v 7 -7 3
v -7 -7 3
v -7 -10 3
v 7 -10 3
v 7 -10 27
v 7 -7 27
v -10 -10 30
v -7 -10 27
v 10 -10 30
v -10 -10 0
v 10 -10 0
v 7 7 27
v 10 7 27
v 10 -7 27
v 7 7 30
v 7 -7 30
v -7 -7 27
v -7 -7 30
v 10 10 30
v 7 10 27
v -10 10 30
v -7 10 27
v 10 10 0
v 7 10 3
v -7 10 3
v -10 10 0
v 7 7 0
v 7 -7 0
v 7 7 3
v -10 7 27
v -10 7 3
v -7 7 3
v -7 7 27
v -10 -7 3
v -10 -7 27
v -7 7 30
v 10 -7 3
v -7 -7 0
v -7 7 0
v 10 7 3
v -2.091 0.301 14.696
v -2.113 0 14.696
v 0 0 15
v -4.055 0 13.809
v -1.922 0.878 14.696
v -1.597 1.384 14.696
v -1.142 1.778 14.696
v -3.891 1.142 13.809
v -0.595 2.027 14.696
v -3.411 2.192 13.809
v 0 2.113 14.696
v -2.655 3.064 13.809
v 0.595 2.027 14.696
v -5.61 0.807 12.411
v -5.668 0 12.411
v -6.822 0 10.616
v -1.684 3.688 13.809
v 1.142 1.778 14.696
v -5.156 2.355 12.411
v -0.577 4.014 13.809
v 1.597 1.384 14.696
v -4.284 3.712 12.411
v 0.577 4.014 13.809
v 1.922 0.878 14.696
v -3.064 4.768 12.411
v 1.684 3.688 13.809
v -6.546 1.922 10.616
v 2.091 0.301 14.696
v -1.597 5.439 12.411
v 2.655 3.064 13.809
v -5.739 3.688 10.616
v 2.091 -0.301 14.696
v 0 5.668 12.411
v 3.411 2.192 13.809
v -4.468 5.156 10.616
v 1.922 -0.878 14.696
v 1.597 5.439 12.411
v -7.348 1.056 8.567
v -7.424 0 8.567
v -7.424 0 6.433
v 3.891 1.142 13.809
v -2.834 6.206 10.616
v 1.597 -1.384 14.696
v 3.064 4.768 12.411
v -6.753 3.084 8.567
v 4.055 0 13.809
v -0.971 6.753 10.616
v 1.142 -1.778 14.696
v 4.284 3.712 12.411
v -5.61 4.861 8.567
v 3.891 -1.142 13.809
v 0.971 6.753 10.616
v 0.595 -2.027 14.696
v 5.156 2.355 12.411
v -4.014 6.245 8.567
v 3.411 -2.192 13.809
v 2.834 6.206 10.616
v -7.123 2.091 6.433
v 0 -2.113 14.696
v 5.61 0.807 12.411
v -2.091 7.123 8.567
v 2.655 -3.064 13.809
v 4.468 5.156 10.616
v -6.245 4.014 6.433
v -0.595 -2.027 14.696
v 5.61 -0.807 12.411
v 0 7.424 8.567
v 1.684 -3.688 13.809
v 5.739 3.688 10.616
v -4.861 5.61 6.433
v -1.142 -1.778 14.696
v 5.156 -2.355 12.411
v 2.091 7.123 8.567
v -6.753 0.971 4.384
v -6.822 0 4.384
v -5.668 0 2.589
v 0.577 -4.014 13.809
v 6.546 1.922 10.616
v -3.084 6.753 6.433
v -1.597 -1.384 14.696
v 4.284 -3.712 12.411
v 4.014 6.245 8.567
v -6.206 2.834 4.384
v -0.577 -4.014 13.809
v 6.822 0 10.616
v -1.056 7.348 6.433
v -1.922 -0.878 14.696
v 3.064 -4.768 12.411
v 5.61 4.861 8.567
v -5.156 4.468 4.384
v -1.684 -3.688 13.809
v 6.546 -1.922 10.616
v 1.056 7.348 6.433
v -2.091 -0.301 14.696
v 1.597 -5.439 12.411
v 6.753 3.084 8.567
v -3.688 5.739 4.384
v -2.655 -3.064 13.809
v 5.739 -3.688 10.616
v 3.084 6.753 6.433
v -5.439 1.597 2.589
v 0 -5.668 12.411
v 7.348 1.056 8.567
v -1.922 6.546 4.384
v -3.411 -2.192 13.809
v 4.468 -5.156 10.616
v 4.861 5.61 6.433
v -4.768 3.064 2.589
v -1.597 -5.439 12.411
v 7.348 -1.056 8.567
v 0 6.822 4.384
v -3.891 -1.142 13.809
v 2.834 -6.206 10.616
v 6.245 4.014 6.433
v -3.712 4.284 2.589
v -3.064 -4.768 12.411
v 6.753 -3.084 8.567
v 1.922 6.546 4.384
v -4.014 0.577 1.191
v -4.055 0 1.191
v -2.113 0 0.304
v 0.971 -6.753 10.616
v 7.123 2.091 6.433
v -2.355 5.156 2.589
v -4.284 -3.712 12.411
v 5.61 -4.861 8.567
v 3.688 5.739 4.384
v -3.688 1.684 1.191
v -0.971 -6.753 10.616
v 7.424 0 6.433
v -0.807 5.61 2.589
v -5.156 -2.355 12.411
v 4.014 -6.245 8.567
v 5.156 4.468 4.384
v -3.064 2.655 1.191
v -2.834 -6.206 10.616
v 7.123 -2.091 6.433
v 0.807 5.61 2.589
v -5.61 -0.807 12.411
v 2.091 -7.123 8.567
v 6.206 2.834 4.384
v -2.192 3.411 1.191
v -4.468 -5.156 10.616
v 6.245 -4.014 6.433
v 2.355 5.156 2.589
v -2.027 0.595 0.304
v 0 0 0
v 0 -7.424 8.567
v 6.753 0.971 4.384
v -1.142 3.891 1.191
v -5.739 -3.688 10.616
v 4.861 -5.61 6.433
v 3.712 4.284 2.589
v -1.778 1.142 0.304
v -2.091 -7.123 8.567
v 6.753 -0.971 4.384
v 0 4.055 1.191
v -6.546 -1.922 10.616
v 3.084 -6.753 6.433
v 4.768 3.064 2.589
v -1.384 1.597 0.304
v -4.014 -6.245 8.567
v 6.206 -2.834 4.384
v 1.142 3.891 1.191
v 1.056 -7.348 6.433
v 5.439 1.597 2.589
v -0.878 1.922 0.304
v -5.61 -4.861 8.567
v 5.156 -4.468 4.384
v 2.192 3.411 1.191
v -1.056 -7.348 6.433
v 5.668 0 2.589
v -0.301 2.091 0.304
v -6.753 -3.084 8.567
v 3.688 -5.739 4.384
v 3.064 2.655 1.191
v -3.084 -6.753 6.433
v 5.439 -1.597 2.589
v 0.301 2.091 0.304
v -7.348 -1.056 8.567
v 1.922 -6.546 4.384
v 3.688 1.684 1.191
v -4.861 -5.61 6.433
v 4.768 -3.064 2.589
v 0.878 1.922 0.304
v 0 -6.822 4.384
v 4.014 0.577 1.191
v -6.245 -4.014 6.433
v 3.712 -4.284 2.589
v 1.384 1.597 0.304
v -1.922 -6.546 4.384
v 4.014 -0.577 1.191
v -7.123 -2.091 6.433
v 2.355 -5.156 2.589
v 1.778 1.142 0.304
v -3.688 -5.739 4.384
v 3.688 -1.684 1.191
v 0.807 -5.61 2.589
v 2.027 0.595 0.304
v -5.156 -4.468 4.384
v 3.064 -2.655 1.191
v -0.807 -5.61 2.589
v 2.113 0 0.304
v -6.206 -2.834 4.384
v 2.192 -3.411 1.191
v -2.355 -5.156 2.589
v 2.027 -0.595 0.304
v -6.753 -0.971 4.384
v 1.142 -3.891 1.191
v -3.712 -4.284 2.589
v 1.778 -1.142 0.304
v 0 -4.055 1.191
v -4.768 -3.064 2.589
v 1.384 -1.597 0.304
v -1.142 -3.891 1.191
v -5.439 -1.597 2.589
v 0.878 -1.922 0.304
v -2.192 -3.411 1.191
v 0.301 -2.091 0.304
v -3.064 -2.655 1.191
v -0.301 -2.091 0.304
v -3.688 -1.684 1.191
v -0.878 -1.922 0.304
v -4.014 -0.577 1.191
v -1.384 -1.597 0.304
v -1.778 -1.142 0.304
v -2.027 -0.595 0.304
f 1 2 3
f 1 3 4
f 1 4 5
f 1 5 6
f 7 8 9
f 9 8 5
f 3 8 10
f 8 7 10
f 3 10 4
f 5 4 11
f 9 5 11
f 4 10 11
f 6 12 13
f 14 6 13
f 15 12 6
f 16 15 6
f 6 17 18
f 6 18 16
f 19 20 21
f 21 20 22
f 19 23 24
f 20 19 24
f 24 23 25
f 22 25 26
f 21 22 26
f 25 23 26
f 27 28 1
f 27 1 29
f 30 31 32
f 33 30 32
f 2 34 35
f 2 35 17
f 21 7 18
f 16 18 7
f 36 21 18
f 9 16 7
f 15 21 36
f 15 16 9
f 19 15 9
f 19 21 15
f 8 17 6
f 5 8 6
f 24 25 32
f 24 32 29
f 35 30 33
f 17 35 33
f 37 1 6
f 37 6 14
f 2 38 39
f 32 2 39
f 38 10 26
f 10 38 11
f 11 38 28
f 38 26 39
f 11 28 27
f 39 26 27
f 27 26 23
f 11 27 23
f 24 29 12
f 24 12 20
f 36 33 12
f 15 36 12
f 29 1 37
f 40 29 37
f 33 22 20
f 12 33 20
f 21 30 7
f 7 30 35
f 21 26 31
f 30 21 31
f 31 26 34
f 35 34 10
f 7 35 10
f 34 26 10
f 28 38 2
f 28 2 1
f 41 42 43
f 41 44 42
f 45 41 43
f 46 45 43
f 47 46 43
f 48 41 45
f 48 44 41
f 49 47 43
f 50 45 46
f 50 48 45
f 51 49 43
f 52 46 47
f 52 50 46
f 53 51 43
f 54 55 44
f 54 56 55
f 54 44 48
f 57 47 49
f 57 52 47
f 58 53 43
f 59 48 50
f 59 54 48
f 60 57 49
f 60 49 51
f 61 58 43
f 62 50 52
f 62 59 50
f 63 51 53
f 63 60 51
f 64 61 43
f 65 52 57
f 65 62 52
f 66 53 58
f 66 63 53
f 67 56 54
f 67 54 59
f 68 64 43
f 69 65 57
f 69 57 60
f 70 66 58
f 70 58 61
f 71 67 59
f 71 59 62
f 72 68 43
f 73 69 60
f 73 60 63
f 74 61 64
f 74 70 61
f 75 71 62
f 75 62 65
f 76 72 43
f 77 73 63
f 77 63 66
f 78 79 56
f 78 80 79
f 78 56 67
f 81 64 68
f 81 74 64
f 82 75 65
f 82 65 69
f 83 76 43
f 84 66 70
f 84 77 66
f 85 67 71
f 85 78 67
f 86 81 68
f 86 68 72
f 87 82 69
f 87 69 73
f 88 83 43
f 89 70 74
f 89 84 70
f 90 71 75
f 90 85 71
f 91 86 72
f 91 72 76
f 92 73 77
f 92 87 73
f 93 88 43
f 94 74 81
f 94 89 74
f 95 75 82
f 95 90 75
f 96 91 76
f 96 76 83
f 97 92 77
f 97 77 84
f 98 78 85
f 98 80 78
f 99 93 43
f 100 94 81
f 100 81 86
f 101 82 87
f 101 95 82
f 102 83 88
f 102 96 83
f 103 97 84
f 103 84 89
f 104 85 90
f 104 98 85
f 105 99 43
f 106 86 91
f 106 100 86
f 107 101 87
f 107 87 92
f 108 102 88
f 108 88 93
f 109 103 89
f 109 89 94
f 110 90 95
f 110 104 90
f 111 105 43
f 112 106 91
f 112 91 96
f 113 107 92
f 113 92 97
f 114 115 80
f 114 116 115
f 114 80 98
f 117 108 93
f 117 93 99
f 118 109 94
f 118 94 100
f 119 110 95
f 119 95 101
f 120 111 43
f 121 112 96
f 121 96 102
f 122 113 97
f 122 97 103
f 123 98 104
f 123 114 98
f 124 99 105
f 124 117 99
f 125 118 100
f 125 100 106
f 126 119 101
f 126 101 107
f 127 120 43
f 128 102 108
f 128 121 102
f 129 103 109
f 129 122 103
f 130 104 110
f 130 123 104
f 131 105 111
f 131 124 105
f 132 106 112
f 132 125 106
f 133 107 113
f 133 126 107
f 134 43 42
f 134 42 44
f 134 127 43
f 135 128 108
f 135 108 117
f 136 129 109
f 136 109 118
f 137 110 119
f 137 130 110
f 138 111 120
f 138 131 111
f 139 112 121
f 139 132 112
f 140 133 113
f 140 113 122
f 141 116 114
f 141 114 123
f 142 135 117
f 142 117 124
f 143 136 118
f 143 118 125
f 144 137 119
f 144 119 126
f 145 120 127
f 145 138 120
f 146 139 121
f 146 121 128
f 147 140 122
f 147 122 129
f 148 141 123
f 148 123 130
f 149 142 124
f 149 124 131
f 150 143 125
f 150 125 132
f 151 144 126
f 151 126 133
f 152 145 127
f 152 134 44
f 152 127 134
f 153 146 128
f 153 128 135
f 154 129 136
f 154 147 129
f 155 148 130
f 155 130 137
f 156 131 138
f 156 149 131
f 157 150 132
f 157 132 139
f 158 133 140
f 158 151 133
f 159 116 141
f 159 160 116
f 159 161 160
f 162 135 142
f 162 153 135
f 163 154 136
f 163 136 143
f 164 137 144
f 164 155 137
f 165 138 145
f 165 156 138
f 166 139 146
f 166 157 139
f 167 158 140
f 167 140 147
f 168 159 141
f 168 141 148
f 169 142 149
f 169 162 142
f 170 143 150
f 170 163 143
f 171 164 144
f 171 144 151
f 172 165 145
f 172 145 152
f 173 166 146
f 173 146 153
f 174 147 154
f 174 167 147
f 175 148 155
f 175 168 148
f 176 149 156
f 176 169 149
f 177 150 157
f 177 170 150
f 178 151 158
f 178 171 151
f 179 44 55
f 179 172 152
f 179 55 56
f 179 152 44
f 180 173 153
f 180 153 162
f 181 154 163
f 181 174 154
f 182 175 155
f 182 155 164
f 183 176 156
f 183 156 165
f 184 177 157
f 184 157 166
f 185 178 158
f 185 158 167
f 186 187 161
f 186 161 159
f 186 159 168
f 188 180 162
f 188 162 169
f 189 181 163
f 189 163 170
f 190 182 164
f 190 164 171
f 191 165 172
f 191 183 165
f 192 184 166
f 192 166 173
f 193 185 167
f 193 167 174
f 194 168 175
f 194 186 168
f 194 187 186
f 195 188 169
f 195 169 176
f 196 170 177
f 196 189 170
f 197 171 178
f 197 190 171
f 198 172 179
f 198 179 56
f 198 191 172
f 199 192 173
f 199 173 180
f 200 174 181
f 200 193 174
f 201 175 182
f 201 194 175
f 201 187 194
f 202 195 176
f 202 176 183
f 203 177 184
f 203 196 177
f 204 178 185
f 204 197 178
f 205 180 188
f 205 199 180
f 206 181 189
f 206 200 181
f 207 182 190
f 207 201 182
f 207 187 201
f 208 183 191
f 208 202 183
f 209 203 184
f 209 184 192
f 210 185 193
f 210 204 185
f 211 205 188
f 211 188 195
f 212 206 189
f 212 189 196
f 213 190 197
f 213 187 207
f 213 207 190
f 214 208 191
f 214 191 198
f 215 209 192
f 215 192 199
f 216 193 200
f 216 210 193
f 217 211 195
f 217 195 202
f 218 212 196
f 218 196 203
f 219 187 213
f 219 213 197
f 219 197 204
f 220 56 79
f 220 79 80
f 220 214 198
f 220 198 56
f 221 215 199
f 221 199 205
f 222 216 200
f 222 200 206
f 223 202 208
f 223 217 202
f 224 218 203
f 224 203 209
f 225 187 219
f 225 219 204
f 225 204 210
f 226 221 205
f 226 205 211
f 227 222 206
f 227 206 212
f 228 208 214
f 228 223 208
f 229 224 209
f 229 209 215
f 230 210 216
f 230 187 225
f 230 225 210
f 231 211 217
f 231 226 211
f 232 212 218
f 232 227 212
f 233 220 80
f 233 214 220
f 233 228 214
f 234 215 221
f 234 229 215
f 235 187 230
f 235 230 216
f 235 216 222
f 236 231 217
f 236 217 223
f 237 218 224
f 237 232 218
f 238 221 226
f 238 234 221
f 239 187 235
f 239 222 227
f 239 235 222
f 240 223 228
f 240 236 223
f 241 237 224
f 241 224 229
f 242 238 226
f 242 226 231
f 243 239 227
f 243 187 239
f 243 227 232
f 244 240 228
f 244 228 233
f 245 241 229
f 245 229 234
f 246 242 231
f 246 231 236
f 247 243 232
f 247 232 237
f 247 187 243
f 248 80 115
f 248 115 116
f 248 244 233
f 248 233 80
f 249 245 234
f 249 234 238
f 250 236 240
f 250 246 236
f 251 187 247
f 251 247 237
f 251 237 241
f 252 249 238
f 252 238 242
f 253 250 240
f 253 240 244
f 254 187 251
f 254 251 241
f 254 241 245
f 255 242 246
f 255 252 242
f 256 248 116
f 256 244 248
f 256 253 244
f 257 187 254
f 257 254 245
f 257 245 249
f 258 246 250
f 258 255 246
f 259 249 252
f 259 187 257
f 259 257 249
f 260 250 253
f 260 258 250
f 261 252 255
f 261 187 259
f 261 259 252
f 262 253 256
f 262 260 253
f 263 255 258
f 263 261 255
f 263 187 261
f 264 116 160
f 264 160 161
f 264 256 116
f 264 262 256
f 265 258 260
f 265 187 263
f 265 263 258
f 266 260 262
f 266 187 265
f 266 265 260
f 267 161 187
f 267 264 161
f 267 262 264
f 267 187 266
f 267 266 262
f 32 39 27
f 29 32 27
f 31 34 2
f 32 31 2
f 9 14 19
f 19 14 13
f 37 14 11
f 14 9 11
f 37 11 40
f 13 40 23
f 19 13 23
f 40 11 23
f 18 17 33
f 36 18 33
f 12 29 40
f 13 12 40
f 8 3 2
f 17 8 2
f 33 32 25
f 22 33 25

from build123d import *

# Parameters (mm, degrees)
F0_W     = 14
F0_H     = 3
F0_W_2   = 3
F0_H_2   = 14
F1_DEPTH = 3
F2_DEPTH = 30
F3_START = 27
F3_DEPTH = 3


with BuildPart() as f1:
    # F0 (on Top) → F1 (new body)
    with BuildSketch(Plane.XY):
        with Locations((0, -8.5)):
            Rectangle(F0_W, F0_H)
        with Locations((-8.5, 0)):
            Rectangle(F0_W_2, F0_H_2)
        with Locations((0, 8.5)):
            Rectangle(F0_W, F0_H)
        with Locations((8.5, 0)):
            Rectangle(F0_W_2, F0_H_2)
        with Locations((-8.5, -8.5)):
            Rectangle(F0_W_2, F0_H)
        with Locations((8.5, -8.5)):
            Rectangle(F0_W_2, F0_H)
        with Locations((8.5, 8.5)):
            Rectangle(F0_W_2, F0_H)
        with Locations((-8.5, 8.5)):
            Rectangle(F0_W_2, F0_H)
    extrude(amount=F1_DEPTH)

    # F0 (on Top) → F2 (join)
    with BuildSketch(Plane.XY):
        with Locations((-8.5, -8.5)):
            Rectangle(F0_W_2, F0_H)
        with Locations((-8.5, 8.5)):
            Rectangle(F0_W_2, F0_H)
        with Locations((8.5, 8.5)):
            Rectangle(F0_W_2, F0_H)
        with Locations((8.5, -8.5)):
            Rectangle(F0_W_2, F0_H)
    extrude(amount=F2_DEPTH)

    # F0 (on Top) → F3 (join)
    with BuildSketch(Plane.XY.offset(F3_START)):
        with Locations((8.5, 8.5)):
            Rectangle(F0_W_2, F0_H)
        with Locations((0, 8.5)):
            Rectangle(F0_W, F0_H)
        with Locations((8.5, 0)):
            Rectangle(F0_W_2, F0_H_2)
        with Locations((-8.5, 8.5)):
            Rectangle(F0_W_2, F0_H)
        with Locations((8.5, -8.5)):
            Rectangle(F0_W_2, F0_H)
        with Locations((-8.5, 0)):
            Rectangle(F0_W_2, F0_H_2)
        with Locations((0, -8.5)):
            Rectangle(F0_W, F0_H)
        with Locations((-8.5, -8.5)):
            Rectangle(F0_W_2, F0_H)
    extrude(amount=F3_DEPTH)


with BuildPart() as f5:
    # F4 (on Front) → F5 (revolve)
    with BuildSketch(Plane.XZ):
        with BuildLine():
            Line((0, 0), (0, 15))
            ThreePointArc((0, 15), (-7.5, 7.5), (0, 0))
        make_face()
    revolve(axis=Axis((0, 0, 7.5), (0, 0, -1)))


solid = Compound([f1.part, f5.part])
